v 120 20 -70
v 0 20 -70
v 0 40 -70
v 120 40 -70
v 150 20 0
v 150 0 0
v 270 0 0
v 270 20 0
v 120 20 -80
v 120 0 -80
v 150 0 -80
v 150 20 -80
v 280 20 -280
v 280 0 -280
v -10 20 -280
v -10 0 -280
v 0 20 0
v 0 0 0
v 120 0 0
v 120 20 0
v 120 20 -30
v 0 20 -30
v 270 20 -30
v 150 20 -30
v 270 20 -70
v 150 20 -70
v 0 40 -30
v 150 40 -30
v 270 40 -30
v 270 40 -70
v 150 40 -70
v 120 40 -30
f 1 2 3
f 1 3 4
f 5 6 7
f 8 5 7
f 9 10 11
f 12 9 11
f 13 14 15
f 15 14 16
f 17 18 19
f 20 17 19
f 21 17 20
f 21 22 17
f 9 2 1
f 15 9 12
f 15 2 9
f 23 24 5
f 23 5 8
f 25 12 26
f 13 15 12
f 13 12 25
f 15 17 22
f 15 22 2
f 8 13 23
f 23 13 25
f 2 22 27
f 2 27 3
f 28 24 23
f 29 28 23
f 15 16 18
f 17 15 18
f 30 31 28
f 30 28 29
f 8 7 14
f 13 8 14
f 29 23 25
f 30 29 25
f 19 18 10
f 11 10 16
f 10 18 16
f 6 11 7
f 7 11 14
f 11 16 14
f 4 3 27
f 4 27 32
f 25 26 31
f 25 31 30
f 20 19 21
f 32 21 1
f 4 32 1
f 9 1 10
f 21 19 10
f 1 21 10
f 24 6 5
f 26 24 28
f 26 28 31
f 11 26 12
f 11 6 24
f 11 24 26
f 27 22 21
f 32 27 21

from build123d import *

# Parameters (mm, degrees)
BOSS_EXTRUDE2_DEPTH     = 20
SKETCH1_7_W             = 270
SKETCH1_7_H             = 40
BOSS_EXTRUDE3_DEPTH     = 40
SKETCH1_9_W             = 30
SKETCH1_9_H             = 80
CUT_EXTRUDE4_DEPTH      = 41
CUT_EXTRUDE4_DEPTH_BACK = 1


with BuildPart() as part:
    # Sketch1 → Boss-Extrude2 (new body)
    with BuildSketch(Plane(origin=(0, 0, 0), x_dir=(1, 0, 0), z_dir=(0, 1, 0))):
        Polygon((0, 0), (270, 0), (280, 280), (-10, 280), align=None)
    extrude(amount=BOSS_EXTRUDE2_DEPTH)

    # Sketch1_7 → Boss-Extrude3 (add)
    with BuildSketch(Plane(origin=(0, 0, 0), x_dir=(1, 0, 0), z_dir=(0, 1, 0))):
        with Locations((135, 50)):
            Rectangle(SKETCH1_7_W, SKETCH1_7_H)
    extrude(amount=BOSS_EXTRUDE3_DEPTH)

    # Sketch1_9 → Cut-Extrude4 (cut, two sides)
    with BuildSketch(Plane(origin=(0, 0, 0), x_dir=(1, 0, 0), z_dir=(0, 1, 0))) as cut_extrude4_sk:
        with Locations((135, 40)):
            Rectangle(SKETCH1_9_W, SKETCH1_9_H)
    extrude(amount=CUT_EXTRUDE4_DEPTH, mode=Mode.SUBTRACT)
    extrude(cut_extrude4_sk.sketch, amount=-CUT_EXTRUDE4_DEPTH_BACK, mode=Mode.SUBTRACT)


solid = part.part
